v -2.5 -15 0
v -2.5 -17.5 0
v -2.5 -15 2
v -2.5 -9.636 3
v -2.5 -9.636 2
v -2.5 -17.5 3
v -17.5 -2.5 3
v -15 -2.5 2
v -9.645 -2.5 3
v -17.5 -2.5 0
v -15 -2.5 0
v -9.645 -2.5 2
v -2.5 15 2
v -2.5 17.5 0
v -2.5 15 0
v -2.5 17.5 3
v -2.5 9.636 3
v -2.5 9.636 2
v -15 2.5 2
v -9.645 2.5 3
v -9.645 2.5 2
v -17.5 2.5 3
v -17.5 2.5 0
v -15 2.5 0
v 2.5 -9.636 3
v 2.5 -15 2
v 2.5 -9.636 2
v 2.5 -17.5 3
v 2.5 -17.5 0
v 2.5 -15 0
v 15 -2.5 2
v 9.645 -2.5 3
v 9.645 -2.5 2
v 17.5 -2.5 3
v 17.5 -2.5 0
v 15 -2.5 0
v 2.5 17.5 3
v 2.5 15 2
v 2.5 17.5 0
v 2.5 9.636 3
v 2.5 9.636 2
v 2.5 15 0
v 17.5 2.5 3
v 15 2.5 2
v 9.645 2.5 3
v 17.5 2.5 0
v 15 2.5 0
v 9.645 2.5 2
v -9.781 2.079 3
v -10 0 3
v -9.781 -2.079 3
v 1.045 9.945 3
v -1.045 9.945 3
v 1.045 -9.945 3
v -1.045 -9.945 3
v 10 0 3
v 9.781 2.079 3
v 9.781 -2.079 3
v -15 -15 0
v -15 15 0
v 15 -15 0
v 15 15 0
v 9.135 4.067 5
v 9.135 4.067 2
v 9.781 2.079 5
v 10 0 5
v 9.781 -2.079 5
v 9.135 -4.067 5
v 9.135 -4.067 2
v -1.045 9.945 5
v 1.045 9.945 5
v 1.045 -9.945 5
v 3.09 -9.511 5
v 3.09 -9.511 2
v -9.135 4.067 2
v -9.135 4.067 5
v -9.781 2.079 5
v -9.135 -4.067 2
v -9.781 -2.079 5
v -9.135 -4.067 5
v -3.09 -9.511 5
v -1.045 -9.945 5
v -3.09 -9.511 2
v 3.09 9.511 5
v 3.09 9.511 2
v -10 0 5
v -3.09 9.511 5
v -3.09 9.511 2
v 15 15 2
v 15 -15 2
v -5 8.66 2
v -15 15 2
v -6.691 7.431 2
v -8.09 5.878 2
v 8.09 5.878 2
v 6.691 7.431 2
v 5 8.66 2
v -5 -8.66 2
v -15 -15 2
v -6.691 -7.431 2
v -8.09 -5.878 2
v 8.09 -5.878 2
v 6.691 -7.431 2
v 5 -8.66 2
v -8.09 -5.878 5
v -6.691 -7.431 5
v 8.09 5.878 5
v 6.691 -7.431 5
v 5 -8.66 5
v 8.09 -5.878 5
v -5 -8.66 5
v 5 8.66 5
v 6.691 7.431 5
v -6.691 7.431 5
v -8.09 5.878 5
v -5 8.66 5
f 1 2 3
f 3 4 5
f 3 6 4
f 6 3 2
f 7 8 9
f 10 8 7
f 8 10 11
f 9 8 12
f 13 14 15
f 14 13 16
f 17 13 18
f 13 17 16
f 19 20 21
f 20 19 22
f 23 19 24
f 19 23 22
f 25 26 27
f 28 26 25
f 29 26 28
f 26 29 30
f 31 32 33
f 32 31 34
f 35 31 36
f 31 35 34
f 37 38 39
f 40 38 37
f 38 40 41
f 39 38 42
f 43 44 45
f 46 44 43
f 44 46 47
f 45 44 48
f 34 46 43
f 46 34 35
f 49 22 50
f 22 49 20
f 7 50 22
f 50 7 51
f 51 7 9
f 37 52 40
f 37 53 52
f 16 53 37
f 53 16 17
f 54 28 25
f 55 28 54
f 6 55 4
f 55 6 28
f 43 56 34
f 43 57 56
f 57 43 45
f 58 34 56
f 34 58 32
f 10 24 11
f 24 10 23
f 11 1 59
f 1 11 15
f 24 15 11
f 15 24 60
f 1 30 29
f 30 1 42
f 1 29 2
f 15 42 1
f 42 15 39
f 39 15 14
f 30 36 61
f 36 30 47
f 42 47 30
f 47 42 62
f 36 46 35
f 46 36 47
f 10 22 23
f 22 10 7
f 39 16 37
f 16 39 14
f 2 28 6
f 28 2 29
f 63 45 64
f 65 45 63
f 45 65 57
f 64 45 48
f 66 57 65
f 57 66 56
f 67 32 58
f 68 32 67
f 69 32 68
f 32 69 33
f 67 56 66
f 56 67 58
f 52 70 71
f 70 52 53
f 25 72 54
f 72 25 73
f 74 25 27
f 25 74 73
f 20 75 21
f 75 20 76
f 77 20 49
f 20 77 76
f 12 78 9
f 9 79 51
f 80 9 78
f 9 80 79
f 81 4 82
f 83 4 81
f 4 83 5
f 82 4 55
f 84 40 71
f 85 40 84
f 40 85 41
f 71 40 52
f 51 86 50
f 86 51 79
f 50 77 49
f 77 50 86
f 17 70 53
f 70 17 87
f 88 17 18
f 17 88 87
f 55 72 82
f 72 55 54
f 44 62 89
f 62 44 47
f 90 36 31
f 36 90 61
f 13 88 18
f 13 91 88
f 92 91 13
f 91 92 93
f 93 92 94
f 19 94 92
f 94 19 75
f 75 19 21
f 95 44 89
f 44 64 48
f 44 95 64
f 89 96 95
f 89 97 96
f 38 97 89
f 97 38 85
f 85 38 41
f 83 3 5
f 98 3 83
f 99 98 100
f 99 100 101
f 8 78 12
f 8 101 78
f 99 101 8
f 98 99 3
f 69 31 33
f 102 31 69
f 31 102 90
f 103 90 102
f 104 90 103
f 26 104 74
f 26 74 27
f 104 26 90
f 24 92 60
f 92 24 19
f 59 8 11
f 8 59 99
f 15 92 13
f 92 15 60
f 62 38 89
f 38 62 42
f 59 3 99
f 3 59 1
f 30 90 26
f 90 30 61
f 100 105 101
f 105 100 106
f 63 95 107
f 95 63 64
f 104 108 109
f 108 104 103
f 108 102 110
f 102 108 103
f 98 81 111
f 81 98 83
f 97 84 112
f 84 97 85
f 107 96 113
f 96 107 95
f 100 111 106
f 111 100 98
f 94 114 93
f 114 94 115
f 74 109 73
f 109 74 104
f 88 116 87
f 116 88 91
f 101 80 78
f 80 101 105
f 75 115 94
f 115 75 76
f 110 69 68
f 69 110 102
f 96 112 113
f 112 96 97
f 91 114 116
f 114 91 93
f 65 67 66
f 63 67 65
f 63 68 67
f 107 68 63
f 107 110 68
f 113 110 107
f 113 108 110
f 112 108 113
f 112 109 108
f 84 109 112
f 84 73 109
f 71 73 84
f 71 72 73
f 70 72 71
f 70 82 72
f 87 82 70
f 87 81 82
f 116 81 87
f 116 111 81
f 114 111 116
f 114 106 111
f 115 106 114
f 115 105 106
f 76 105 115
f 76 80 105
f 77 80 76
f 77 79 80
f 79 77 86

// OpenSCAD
green();
red();
white();

module green()
{
	color("green")
	difference()
	{
		translate([0,0,1])
			cube([30,30,2], center=true);
		white();
		red();
	}
}

module white()
{
		color("white")
		translate([0,0,2.5])
			cylinder(r=10,h=5,center=true, $fn=30);
}

module red()
{
	color("red")
	difference()
	{
		translate([0,0,1.5])
			difference()
			{
				cube([35,35,3], center=true);
				for(x=[-1,1])
					for(y=[-1,1])
						translate([x*20,y*20,0])
							cube([35,35,5], center=true);
			}
		white();
	}
}
